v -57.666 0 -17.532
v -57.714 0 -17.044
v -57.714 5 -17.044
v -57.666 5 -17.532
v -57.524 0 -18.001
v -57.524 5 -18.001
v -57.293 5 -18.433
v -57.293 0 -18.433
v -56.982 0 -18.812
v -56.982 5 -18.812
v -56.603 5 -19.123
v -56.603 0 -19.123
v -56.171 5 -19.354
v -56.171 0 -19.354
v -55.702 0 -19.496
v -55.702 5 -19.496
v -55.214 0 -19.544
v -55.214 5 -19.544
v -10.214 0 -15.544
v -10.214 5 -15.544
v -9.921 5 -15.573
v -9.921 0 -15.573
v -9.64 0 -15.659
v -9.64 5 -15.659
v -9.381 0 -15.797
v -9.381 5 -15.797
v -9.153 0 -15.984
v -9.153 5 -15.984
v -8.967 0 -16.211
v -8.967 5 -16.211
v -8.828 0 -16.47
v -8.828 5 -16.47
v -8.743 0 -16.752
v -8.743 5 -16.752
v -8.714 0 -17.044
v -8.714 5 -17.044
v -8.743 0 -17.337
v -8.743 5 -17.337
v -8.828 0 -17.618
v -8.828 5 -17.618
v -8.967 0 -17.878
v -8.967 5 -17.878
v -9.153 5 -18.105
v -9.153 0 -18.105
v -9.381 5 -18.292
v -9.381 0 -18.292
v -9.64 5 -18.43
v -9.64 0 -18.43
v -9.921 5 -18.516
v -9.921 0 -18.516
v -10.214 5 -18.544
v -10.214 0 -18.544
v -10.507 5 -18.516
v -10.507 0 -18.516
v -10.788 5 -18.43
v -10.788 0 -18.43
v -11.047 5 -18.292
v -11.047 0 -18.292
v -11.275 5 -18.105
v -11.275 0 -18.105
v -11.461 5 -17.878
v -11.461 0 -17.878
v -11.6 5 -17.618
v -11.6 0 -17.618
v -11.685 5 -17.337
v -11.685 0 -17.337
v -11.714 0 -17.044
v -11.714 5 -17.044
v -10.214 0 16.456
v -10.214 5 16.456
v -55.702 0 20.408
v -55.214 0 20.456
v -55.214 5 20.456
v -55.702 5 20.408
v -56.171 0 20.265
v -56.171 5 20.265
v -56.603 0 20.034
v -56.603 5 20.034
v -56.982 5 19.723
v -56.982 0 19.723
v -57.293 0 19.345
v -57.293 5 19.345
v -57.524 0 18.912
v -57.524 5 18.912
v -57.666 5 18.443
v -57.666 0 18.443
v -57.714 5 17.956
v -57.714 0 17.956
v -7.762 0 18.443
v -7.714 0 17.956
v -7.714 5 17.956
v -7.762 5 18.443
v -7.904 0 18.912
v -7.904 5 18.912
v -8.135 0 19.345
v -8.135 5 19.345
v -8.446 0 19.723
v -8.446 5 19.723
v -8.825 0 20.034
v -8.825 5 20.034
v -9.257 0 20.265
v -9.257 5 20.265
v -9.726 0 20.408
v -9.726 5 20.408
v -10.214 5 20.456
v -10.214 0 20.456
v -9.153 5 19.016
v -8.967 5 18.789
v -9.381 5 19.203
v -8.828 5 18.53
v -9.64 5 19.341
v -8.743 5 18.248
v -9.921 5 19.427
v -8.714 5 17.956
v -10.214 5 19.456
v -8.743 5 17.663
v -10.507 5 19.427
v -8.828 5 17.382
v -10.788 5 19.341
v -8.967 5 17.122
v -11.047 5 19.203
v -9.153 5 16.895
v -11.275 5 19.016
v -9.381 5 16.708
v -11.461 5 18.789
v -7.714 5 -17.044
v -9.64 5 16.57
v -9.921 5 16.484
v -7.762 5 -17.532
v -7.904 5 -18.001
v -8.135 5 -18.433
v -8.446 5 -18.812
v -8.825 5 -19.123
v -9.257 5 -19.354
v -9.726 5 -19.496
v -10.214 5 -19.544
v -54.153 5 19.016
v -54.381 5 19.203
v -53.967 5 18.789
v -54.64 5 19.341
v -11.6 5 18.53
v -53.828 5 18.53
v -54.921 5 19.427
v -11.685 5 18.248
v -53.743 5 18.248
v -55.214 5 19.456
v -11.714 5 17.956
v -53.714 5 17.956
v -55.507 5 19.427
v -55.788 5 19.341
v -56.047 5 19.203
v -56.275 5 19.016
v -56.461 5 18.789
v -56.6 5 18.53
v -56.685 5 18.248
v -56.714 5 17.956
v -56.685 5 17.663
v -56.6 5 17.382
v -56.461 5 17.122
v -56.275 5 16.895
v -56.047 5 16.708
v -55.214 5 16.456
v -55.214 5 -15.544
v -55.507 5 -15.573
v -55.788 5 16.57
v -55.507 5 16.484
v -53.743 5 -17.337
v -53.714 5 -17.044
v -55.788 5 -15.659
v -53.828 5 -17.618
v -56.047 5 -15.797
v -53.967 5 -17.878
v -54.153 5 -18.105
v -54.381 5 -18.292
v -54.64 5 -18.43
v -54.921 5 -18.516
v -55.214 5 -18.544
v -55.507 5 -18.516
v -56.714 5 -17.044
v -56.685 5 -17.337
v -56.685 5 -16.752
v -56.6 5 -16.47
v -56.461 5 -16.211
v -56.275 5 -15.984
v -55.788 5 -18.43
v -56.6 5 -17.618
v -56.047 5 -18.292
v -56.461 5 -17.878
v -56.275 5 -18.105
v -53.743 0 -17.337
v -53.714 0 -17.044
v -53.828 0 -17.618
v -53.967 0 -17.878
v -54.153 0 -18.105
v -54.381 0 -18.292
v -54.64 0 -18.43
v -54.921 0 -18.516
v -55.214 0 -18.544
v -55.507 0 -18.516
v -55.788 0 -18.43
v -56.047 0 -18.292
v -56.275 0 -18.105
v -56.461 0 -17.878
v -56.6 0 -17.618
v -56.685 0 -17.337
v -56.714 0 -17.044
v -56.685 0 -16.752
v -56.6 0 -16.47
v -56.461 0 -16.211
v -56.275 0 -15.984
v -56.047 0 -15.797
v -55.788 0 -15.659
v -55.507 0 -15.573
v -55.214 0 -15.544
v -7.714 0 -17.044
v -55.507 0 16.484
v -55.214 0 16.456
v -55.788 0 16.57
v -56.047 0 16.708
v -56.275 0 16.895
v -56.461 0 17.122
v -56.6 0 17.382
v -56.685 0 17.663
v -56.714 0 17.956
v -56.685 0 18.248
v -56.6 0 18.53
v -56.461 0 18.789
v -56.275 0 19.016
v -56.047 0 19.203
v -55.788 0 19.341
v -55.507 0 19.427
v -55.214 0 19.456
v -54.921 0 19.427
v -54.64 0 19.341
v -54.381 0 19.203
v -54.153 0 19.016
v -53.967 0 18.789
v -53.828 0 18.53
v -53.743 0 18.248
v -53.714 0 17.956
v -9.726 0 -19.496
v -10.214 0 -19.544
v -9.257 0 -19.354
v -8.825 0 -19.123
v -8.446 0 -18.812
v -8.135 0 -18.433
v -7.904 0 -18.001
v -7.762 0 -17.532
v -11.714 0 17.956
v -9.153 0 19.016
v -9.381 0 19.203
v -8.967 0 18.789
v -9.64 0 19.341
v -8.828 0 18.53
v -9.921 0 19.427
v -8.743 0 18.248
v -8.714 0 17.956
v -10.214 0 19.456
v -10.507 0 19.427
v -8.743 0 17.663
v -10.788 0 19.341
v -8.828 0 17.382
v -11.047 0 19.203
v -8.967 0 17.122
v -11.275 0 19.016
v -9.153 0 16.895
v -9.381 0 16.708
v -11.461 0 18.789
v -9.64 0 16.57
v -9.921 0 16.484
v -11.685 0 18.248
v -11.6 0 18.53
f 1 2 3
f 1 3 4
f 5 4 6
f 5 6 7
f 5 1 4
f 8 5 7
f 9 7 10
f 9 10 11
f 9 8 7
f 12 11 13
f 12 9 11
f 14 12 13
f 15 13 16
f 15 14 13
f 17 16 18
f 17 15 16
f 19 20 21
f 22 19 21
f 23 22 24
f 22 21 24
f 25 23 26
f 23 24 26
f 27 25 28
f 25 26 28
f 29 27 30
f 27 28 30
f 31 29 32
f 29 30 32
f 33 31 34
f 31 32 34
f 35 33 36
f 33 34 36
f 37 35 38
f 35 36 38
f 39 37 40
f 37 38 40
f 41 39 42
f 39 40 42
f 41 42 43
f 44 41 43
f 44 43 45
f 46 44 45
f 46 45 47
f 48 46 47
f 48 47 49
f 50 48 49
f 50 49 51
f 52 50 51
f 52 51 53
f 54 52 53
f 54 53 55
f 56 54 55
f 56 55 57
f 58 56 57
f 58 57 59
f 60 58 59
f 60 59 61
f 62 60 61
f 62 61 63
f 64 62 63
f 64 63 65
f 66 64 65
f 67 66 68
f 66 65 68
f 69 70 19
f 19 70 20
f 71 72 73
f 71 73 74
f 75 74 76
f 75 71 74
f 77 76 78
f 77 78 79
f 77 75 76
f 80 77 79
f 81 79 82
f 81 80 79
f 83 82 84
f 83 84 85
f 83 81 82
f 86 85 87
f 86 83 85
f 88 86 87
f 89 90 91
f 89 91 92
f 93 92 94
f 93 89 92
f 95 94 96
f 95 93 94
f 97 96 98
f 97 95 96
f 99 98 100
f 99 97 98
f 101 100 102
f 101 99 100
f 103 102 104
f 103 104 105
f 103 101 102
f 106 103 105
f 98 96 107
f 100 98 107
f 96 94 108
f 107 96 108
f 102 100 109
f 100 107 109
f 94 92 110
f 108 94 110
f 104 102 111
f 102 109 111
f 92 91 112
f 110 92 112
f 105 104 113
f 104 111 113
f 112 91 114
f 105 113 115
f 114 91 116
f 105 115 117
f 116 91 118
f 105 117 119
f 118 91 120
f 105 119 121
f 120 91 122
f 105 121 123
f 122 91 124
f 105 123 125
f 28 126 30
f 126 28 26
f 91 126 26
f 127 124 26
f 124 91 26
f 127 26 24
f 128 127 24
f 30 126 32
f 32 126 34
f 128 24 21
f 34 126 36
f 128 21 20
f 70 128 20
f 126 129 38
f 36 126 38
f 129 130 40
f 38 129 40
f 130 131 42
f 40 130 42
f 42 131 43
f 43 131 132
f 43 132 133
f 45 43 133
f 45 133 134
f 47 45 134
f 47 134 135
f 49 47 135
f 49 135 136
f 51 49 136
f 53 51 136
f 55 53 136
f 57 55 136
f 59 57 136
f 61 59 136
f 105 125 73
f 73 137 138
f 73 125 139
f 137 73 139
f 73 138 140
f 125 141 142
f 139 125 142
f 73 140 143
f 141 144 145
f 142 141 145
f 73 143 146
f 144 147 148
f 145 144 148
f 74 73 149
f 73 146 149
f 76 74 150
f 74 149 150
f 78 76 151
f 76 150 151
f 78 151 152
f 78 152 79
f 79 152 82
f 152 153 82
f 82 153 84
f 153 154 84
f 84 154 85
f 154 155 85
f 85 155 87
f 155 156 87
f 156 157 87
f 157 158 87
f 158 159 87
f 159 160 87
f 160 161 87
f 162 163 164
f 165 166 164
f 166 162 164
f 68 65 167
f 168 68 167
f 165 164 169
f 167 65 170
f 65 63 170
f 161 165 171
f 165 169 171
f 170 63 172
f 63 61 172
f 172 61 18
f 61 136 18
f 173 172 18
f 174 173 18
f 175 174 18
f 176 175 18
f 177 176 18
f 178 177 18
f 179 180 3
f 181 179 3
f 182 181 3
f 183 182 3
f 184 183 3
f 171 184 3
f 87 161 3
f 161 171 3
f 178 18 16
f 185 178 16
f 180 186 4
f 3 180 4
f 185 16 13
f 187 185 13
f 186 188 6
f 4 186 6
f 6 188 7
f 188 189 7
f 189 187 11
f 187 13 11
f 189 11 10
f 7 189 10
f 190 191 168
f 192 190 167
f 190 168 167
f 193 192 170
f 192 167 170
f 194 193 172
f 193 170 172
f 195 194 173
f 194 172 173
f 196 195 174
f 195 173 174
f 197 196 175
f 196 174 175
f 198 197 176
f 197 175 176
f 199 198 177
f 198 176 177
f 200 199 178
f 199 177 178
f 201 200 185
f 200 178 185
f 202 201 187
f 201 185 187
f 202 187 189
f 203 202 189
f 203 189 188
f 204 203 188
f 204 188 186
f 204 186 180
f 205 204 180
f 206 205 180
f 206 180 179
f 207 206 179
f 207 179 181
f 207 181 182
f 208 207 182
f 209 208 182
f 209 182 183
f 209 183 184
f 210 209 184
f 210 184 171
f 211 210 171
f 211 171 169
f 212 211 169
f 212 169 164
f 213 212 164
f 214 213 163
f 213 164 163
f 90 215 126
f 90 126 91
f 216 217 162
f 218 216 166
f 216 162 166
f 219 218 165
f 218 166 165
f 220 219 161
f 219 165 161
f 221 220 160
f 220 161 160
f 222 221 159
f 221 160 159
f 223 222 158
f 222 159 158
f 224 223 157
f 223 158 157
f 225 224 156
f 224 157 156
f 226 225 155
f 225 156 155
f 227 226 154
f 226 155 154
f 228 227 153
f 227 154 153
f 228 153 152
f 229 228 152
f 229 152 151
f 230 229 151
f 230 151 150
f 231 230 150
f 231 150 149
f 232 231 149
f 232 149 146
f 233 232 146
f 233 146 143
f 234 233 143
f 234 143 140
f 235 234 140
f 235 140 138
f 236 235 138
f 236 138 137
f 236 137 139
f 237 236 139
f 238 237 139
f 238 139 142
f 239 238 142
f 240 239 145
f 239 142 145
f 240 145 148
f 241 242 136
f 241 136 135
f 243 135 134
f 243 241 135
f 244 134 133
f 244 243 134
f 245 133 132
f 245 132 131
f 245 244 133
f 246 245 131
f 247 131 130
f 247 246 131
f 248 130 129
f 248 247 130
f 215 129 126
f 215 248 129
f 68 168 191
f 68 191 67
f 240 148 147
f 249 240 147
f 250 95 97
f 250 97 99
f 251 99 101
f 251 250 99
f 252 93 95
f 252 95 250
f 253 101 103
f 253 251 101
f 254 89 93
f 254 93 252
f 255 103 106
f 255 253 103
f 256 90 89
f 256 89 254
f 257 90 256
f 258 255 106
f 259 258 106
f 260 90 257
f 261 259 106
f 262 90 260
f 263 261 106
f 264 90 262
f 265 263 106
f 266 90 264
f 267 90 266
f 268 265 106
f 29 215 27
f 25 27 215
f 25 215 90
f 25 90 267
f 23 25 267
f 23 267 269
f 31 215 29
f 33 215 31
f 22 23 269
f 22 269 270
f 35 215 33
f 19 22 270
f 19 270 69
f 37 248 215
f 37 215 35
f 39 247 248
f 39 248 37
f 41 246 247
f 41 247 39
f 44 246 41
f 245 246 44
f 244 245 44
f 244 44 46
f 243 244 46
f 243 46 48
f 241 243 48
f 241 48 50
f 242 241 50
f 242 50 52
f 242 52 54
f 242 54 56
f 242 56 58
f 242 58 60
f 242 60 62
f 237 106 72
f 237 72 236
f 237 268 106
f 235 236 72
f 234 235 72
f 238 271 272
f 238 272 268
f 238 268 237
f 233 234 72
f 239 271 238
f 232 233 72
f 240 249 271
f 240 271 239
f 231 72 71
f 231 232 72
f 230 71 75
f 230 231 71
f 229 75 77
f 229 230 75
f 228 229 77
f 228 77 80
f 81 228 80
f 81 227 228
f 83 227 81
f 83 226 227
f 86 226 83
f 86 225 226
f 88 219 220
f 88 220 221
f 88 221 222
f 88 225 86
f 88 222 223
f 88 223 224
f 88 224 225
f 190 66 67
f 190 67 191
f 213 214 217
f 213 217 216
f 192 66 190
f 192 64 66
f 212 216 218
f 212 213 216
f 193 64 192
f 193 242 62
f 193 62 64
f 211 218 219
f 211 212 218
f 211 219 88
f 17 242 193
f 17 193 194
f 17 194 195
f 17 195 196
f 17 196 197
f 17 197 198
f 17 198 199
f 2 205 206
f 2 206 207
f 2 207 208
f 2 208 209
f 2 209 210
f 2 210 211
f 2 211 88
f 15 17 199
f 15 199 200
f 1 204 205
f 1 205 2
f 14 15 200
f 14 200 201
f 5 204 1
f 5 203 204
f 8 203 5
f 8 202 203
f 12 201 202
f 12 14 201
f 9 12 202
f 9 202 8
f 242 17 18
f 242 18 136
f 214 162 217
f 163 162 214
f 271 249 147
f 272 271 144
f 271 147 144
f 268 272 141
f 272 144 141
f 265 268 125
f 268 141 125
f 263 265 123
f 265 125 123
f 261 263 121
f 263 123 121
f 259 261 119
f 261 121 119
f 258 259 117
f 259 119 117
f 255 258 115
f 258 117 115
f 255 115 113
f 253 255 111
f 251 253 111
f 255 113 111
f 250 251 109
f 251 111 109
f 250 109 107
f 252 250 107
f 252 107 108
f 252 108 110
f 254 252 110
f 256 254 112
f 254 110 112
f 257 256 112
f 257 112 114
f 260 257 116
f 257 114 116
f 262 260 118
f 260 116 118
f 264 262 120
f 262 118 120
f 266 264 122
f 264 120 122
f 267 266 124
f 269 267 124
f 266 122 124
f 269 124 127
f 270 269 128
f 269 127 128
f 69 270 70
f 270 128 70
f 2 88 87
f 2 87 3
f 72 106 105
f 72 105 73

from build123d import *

# Parameters (mm, degrees)
EXTRUDE_3_DEPTH     = 5
SKETCH_7_R          = 1.5
CUT_EXTRUDE_1_DEPTH = 62.435637135
SKETCH_8_W          = 45
SKETCH_8_H          = 35
CUT_EXTRUDE_2_DEPTH = 62.435637135


with BuildPart() as part:
    # 草图1 → 凸台-拉伸3 (new body)
    with BuildSketch(Plane(origin=(0, 0, 0), x_dir=(1, 0, 0), z_dir=(0, 1, 0))):
        with BuildLine():
            Line((-55.213994356, 19.544380587), (-10.213994356, 19.544380587))
            ThreePointArc((-10.213994356, 19.544380587), (-8.446227403, 18.81214754), (-7.713994356, 17.044380587))
            Line((-7.713994356, 17.044380587), (-7.713994356, -17.955619413))
            ThreePointArc((-7.713994356, -17.955619413), (-8.446227403, -19.723386366), (-10.213994356, -20.455619413))
            Line((-10.213994356, -20.455619413), (-55.213994356, -20.455619413))
            ThreePointArc((-55.213994356, -20.455619413), (-56.981761309, -19.723386366), (-57.713994356, -17.955619413))
            Line((-57.713994356, -17.955619413), (-57.713994356, 17.044380587))
            ThreePointArc((-57.713994356, 17.044380587), (-56.981761309, 18.81214754), (-55.213994356, 19.544380587))
        make_face()
    extrude(amount=EXTRUDE_3_DEPTH)

    # 草图7 → 切除-拉伸1 (cut, through all)
    with BuildSketch(Plane(origin=(0, 5, 0), x_dir=(1, 0, 0), z_dir=(0, 1, 0))):
        with Locations(Location((-55.213994356, 17.044380587, 0), (0, 0, 270))):
            Circle(SKETCH_7_R)
        with Locations(Location((-10.213994356, 17.044380587, 0), (0, 0, 270))):
            Circle(SKETCH_7_R)
        with Locations(Location((-55.213994356, -17.955619413, 0), (0, 0, 270))):
            Circle(SKETCH_7_R)
        with Locations(Location((-10.213994356, -17.955619413, 0), (0, 0, 270))):
            Circle(SKETCH_7_R)
    extrude(amount=-CUT_EXTRUDE_1_DEPTH, mode=Mode.SUBTRACT)

    # 草图8 → 切除-拉伸2 (cut, through all)
    with BuildSketch(Plane(origin=(0, 5, 0), x_dir=(1, 0, 0), z_dir=(0, 1, 0))):
        with Locations((-32.713994356, -0.455619413)):
            Rectangle(SKETCH_8_W, SKETCH_8_H)
    extrude(amount=-CUT_EXTRUDE_2_DEPTH, mode=Mode.SUBTRACT)


solid = part.part
